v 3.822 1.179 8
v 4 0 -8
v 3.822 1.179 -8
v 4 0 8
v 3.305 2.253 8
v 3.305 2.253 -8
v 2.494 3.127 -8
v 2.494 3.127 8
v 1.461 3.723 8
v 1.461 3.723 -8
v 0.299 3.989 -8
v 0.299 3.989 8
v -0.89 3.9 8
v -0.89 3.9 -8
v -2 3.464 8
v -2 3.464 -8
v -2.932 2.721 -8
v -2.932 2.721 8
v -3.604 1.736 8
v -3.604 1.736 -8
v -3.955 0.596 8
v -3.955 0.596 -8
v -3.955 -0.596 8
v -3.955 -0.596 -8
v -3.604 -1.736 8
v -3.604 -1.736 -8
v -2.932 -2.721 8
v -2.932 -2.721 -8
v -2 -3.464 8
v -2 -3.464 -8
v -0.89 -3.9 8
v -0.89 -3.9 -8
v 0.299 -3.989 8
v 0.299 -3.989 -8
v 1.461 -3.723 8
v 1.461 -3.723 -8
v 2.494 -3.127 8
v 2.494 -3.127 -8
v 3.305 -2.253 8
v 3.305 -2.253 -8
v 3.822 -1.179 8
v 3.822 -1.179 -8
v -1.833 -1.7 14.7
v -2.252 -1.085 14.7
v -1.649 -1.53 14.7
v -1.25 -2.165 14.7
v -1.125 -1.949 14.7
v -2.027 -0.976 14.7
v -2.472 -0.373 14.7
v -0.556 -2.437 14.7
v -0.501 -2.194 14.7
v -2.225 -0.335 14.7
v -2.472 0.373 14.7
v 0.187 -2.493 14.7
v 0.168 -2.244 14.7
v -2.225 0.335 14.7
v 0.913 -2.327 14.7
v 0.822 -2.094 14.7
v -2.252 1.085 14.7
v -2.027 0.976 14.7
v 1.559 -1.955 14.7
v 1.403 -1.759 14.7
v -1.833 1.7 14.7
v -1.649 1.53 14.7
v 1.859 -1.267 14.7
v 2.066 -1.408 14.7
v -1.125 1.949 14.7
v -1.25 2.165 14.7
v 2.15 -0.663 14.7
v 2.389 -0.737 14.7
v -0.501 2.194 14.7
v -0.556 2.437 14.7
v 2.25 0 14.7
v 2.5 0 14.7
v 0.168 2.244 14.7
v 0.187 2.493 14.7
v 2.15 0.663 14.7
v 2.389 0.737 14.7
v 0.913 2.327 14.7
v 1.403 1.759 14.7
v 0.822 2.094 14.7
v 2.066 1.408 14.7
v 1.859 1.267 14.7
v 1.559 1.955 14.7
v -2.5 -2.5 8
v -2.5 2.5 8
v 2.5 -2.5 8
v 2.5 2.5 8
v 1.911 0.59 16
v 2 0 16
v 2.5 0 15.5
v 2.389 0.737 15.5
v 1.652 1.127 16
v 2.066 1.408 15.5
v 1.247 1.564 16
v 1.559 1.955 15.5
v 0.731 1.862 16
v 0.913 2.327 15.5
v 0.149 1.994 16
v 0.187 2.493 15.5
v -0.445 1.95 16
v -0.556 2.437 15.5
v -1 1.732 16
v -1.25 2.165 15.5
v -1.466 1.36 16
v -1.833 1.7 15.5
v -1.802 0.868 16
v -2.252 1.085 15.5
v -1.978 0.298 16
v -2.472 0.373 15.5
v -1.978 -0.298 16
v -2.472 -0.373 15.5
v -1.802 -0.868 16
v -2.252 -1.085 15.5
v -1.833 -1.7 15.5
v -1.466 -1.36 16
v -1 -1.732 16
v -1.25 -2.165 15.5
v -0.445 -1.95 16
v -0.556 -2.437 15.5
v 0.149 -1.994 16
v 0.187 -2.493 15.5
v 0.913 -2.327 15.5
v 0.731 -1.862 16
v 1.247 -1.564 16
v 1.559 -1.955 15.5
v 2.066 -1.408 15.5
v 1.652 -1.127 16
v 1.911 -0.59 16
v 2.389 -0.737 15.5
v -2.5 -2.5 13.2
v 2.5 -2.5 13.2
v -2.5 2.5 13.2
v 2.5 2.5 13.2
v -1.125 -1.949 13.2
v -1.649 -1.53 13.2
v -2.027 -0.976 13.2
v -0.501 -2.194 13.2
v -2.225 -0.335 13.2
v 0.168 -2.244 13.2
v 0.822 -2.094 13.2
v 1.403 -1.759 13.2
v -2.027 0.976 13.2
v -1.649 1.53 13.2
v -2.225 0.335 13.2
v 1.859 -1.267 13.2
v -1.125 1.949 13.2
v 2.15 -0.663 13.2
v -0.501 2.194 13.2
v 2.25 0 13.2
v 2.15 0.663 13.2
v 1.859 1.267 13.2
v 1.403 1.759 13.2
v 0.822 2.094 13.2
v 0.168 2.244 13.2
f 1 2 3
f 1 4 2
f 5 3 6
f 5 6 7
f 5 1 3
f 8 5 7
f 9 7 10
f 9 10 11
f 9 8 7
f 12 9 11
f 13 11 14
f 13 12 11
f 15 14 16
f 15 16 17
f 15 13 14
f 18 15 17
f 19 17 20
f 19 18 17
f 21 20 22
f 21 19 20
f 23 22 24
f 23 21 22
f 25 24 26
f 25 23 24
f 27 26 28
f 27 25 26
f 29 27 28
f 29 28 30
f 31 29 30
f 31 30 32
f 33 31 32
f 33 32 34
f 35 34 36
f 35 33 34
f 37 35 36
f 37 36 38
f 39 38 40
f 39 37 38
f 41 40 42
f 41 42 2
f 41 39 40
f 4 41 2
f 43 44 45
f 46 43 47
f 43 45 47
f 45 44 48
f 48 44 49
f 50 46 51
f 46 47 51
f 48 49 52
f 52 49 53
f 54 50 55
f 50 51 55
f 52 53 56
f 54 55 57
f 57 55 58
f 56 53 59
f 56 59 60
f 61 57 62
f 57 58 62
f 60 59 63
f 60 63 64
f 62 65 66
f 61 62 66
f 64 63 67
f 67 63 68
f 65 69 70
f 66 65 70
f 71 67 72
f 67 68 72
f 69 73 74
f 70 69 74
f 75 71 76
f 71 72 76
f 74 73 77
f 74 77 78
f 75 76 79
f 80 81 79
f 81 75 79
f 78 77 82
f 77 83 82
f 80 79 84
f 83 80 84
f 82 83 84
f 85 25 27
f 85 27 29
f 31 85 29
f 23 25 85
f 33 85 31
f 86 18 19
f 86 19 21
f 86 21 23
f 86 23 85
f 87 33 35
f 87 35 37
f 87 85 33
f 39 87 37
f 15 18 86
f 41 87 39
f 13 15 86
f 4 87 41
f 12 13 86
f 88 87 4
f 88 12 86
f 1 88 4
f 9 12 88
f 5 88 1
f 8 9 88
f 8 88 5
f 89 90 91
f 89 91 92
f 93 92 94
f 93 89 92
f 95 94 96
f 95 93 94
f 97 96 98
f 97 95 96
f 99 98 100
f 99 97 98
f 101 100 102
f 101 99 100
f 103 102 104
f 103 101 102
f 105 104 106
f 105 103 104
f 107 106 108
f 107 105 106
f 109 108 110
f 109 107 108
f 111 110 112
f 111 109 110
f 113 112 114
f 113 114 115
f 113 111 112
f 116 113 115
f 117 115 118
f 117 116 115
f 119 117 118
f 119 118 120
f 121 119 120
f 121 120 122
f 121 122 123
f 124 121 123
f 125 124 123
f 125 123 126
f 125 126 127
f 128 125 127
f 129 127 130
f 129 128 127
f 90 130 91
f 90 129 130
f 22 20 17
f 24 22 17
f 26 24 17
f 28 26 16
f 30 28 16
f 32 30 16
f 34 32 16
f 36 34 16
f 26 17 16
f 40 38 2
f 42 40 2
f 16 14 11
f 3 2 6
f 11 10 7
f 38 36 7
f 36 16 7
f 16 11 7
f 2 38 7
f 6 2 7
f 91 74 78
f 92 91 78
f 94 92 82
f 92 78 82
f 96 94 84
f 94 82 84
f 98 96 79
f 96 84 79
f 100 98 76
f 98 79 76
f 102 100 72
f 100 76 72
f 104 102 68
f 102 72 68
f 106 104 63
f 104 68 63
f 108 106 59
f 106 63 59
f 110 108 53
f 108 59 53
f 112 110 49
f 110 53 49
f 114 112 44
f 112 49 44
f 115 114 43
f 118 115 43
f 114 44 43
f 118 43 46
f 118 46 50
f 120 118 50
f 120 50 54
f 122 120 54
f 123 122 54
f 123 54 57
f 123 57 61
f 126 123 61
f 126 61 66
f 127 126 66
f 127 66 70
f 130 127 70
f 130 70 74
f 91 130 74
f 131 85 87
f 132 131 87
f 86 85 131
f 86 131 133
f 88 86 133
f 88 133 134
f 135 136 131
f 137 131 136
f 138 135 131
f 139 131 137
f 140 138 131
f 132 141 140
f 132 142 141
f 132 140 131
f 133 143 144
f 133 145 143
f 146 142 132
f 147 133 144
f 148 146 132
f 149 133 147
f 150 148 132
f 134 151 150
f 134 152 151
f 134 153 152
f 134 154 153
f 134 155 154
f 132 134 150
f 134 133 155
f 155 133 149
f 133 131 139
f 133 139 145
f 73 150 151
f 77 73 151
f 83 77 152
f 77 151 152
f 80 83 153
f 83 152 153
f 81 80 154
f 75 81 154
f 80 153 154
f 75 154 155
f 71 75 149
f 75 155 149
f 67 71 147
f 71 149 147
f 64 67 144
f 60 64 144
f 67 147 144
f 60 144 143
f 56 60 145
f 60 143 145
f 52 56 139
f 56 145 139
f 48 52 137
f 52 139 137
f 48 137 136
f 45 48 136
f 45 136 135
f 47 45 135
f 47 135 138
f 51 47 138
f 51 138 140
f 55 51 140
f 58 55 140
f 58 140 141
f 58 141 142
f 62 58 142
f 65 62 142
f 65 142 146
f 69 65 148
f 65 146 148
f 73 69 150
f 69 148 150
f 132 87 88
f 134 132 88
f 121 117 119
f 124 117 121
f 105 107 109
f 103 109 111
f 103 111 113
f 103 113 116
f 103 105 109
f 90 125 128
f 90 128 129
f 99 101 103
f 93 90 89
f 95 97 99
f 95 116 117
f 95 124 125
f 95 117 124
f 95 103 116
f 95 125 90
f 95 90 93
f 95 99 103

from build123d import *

# Parameters (mm, degrees)
SKETCH_1_R          = 4
EXTRUDE_1_DEPTH     = 8
SKETCH_2_W          = 5
SKETCH_2_H          = 5
EXTRUDE_2_DEPTH     = 5.2
SKETCH_3_R          = 2.5
EXTRUDE_3_DEPTH     = 2.8
SKETCH_4_OUTSIDE_W  = 15.306
SKETCH_4_OUTSIDE_H  = 15.306
SKETCH_4_OUTSIDE_R  = 2.25
CUT_EXTRUDE_1_DEPTH = 1.5
CHAMFER_1_SIZE      = 0.5


with BuildPart() as part:
    # 草图1 → 凸台-拉伸1 (new, symmetric)
    with BuildSketch(Plane.XY):
        Circle(SKETCH_1_R)
    extrude(amount=EXTRUDE_1_DEPTH, both=True)

    # 草图2 → 凸台-拉伸2 (add)
    with BuildSketch(Plane.XY.offset(8)):
        Rectangle(SKETCH_2_W, SKETCH_2_H)
    extrude(amount=EXTRUDE_2_DEPTH)

    # 草图3 → 凸台-拉伸3 (add)
    with BuildSketch(Plane.XY.offset(13.2)):
        Circle(SKETCH_3_R)
    extrude(amount=EXTRUDE_3_DEPTH)

    # 草图4 outside → 切除-拉伸1 (cut)
    with BuildSketch(Plane.XY.offset(13.2)):
        Rectangle(SKETCH_4_OUTSIDE_W, SKETCH_4_OUTSIDE_H)
        Circle(SKETCH_4_OUTSIDE_R, mode=Mode.SUBTRACT)
    extrude(amount=CUT_EXTRUDE_1_DEPTH, mode=Mode.SUBTRACT)

    # 倒角1
    chamfer_1_edges = [part.edges().sort_by_distance(p)[0] for p in [
        (-2.5, 0, 16),
    ]]
    chamfer(chamfer_1_edges, length=CHAMFER_1_SIZE)


solid = part.part
